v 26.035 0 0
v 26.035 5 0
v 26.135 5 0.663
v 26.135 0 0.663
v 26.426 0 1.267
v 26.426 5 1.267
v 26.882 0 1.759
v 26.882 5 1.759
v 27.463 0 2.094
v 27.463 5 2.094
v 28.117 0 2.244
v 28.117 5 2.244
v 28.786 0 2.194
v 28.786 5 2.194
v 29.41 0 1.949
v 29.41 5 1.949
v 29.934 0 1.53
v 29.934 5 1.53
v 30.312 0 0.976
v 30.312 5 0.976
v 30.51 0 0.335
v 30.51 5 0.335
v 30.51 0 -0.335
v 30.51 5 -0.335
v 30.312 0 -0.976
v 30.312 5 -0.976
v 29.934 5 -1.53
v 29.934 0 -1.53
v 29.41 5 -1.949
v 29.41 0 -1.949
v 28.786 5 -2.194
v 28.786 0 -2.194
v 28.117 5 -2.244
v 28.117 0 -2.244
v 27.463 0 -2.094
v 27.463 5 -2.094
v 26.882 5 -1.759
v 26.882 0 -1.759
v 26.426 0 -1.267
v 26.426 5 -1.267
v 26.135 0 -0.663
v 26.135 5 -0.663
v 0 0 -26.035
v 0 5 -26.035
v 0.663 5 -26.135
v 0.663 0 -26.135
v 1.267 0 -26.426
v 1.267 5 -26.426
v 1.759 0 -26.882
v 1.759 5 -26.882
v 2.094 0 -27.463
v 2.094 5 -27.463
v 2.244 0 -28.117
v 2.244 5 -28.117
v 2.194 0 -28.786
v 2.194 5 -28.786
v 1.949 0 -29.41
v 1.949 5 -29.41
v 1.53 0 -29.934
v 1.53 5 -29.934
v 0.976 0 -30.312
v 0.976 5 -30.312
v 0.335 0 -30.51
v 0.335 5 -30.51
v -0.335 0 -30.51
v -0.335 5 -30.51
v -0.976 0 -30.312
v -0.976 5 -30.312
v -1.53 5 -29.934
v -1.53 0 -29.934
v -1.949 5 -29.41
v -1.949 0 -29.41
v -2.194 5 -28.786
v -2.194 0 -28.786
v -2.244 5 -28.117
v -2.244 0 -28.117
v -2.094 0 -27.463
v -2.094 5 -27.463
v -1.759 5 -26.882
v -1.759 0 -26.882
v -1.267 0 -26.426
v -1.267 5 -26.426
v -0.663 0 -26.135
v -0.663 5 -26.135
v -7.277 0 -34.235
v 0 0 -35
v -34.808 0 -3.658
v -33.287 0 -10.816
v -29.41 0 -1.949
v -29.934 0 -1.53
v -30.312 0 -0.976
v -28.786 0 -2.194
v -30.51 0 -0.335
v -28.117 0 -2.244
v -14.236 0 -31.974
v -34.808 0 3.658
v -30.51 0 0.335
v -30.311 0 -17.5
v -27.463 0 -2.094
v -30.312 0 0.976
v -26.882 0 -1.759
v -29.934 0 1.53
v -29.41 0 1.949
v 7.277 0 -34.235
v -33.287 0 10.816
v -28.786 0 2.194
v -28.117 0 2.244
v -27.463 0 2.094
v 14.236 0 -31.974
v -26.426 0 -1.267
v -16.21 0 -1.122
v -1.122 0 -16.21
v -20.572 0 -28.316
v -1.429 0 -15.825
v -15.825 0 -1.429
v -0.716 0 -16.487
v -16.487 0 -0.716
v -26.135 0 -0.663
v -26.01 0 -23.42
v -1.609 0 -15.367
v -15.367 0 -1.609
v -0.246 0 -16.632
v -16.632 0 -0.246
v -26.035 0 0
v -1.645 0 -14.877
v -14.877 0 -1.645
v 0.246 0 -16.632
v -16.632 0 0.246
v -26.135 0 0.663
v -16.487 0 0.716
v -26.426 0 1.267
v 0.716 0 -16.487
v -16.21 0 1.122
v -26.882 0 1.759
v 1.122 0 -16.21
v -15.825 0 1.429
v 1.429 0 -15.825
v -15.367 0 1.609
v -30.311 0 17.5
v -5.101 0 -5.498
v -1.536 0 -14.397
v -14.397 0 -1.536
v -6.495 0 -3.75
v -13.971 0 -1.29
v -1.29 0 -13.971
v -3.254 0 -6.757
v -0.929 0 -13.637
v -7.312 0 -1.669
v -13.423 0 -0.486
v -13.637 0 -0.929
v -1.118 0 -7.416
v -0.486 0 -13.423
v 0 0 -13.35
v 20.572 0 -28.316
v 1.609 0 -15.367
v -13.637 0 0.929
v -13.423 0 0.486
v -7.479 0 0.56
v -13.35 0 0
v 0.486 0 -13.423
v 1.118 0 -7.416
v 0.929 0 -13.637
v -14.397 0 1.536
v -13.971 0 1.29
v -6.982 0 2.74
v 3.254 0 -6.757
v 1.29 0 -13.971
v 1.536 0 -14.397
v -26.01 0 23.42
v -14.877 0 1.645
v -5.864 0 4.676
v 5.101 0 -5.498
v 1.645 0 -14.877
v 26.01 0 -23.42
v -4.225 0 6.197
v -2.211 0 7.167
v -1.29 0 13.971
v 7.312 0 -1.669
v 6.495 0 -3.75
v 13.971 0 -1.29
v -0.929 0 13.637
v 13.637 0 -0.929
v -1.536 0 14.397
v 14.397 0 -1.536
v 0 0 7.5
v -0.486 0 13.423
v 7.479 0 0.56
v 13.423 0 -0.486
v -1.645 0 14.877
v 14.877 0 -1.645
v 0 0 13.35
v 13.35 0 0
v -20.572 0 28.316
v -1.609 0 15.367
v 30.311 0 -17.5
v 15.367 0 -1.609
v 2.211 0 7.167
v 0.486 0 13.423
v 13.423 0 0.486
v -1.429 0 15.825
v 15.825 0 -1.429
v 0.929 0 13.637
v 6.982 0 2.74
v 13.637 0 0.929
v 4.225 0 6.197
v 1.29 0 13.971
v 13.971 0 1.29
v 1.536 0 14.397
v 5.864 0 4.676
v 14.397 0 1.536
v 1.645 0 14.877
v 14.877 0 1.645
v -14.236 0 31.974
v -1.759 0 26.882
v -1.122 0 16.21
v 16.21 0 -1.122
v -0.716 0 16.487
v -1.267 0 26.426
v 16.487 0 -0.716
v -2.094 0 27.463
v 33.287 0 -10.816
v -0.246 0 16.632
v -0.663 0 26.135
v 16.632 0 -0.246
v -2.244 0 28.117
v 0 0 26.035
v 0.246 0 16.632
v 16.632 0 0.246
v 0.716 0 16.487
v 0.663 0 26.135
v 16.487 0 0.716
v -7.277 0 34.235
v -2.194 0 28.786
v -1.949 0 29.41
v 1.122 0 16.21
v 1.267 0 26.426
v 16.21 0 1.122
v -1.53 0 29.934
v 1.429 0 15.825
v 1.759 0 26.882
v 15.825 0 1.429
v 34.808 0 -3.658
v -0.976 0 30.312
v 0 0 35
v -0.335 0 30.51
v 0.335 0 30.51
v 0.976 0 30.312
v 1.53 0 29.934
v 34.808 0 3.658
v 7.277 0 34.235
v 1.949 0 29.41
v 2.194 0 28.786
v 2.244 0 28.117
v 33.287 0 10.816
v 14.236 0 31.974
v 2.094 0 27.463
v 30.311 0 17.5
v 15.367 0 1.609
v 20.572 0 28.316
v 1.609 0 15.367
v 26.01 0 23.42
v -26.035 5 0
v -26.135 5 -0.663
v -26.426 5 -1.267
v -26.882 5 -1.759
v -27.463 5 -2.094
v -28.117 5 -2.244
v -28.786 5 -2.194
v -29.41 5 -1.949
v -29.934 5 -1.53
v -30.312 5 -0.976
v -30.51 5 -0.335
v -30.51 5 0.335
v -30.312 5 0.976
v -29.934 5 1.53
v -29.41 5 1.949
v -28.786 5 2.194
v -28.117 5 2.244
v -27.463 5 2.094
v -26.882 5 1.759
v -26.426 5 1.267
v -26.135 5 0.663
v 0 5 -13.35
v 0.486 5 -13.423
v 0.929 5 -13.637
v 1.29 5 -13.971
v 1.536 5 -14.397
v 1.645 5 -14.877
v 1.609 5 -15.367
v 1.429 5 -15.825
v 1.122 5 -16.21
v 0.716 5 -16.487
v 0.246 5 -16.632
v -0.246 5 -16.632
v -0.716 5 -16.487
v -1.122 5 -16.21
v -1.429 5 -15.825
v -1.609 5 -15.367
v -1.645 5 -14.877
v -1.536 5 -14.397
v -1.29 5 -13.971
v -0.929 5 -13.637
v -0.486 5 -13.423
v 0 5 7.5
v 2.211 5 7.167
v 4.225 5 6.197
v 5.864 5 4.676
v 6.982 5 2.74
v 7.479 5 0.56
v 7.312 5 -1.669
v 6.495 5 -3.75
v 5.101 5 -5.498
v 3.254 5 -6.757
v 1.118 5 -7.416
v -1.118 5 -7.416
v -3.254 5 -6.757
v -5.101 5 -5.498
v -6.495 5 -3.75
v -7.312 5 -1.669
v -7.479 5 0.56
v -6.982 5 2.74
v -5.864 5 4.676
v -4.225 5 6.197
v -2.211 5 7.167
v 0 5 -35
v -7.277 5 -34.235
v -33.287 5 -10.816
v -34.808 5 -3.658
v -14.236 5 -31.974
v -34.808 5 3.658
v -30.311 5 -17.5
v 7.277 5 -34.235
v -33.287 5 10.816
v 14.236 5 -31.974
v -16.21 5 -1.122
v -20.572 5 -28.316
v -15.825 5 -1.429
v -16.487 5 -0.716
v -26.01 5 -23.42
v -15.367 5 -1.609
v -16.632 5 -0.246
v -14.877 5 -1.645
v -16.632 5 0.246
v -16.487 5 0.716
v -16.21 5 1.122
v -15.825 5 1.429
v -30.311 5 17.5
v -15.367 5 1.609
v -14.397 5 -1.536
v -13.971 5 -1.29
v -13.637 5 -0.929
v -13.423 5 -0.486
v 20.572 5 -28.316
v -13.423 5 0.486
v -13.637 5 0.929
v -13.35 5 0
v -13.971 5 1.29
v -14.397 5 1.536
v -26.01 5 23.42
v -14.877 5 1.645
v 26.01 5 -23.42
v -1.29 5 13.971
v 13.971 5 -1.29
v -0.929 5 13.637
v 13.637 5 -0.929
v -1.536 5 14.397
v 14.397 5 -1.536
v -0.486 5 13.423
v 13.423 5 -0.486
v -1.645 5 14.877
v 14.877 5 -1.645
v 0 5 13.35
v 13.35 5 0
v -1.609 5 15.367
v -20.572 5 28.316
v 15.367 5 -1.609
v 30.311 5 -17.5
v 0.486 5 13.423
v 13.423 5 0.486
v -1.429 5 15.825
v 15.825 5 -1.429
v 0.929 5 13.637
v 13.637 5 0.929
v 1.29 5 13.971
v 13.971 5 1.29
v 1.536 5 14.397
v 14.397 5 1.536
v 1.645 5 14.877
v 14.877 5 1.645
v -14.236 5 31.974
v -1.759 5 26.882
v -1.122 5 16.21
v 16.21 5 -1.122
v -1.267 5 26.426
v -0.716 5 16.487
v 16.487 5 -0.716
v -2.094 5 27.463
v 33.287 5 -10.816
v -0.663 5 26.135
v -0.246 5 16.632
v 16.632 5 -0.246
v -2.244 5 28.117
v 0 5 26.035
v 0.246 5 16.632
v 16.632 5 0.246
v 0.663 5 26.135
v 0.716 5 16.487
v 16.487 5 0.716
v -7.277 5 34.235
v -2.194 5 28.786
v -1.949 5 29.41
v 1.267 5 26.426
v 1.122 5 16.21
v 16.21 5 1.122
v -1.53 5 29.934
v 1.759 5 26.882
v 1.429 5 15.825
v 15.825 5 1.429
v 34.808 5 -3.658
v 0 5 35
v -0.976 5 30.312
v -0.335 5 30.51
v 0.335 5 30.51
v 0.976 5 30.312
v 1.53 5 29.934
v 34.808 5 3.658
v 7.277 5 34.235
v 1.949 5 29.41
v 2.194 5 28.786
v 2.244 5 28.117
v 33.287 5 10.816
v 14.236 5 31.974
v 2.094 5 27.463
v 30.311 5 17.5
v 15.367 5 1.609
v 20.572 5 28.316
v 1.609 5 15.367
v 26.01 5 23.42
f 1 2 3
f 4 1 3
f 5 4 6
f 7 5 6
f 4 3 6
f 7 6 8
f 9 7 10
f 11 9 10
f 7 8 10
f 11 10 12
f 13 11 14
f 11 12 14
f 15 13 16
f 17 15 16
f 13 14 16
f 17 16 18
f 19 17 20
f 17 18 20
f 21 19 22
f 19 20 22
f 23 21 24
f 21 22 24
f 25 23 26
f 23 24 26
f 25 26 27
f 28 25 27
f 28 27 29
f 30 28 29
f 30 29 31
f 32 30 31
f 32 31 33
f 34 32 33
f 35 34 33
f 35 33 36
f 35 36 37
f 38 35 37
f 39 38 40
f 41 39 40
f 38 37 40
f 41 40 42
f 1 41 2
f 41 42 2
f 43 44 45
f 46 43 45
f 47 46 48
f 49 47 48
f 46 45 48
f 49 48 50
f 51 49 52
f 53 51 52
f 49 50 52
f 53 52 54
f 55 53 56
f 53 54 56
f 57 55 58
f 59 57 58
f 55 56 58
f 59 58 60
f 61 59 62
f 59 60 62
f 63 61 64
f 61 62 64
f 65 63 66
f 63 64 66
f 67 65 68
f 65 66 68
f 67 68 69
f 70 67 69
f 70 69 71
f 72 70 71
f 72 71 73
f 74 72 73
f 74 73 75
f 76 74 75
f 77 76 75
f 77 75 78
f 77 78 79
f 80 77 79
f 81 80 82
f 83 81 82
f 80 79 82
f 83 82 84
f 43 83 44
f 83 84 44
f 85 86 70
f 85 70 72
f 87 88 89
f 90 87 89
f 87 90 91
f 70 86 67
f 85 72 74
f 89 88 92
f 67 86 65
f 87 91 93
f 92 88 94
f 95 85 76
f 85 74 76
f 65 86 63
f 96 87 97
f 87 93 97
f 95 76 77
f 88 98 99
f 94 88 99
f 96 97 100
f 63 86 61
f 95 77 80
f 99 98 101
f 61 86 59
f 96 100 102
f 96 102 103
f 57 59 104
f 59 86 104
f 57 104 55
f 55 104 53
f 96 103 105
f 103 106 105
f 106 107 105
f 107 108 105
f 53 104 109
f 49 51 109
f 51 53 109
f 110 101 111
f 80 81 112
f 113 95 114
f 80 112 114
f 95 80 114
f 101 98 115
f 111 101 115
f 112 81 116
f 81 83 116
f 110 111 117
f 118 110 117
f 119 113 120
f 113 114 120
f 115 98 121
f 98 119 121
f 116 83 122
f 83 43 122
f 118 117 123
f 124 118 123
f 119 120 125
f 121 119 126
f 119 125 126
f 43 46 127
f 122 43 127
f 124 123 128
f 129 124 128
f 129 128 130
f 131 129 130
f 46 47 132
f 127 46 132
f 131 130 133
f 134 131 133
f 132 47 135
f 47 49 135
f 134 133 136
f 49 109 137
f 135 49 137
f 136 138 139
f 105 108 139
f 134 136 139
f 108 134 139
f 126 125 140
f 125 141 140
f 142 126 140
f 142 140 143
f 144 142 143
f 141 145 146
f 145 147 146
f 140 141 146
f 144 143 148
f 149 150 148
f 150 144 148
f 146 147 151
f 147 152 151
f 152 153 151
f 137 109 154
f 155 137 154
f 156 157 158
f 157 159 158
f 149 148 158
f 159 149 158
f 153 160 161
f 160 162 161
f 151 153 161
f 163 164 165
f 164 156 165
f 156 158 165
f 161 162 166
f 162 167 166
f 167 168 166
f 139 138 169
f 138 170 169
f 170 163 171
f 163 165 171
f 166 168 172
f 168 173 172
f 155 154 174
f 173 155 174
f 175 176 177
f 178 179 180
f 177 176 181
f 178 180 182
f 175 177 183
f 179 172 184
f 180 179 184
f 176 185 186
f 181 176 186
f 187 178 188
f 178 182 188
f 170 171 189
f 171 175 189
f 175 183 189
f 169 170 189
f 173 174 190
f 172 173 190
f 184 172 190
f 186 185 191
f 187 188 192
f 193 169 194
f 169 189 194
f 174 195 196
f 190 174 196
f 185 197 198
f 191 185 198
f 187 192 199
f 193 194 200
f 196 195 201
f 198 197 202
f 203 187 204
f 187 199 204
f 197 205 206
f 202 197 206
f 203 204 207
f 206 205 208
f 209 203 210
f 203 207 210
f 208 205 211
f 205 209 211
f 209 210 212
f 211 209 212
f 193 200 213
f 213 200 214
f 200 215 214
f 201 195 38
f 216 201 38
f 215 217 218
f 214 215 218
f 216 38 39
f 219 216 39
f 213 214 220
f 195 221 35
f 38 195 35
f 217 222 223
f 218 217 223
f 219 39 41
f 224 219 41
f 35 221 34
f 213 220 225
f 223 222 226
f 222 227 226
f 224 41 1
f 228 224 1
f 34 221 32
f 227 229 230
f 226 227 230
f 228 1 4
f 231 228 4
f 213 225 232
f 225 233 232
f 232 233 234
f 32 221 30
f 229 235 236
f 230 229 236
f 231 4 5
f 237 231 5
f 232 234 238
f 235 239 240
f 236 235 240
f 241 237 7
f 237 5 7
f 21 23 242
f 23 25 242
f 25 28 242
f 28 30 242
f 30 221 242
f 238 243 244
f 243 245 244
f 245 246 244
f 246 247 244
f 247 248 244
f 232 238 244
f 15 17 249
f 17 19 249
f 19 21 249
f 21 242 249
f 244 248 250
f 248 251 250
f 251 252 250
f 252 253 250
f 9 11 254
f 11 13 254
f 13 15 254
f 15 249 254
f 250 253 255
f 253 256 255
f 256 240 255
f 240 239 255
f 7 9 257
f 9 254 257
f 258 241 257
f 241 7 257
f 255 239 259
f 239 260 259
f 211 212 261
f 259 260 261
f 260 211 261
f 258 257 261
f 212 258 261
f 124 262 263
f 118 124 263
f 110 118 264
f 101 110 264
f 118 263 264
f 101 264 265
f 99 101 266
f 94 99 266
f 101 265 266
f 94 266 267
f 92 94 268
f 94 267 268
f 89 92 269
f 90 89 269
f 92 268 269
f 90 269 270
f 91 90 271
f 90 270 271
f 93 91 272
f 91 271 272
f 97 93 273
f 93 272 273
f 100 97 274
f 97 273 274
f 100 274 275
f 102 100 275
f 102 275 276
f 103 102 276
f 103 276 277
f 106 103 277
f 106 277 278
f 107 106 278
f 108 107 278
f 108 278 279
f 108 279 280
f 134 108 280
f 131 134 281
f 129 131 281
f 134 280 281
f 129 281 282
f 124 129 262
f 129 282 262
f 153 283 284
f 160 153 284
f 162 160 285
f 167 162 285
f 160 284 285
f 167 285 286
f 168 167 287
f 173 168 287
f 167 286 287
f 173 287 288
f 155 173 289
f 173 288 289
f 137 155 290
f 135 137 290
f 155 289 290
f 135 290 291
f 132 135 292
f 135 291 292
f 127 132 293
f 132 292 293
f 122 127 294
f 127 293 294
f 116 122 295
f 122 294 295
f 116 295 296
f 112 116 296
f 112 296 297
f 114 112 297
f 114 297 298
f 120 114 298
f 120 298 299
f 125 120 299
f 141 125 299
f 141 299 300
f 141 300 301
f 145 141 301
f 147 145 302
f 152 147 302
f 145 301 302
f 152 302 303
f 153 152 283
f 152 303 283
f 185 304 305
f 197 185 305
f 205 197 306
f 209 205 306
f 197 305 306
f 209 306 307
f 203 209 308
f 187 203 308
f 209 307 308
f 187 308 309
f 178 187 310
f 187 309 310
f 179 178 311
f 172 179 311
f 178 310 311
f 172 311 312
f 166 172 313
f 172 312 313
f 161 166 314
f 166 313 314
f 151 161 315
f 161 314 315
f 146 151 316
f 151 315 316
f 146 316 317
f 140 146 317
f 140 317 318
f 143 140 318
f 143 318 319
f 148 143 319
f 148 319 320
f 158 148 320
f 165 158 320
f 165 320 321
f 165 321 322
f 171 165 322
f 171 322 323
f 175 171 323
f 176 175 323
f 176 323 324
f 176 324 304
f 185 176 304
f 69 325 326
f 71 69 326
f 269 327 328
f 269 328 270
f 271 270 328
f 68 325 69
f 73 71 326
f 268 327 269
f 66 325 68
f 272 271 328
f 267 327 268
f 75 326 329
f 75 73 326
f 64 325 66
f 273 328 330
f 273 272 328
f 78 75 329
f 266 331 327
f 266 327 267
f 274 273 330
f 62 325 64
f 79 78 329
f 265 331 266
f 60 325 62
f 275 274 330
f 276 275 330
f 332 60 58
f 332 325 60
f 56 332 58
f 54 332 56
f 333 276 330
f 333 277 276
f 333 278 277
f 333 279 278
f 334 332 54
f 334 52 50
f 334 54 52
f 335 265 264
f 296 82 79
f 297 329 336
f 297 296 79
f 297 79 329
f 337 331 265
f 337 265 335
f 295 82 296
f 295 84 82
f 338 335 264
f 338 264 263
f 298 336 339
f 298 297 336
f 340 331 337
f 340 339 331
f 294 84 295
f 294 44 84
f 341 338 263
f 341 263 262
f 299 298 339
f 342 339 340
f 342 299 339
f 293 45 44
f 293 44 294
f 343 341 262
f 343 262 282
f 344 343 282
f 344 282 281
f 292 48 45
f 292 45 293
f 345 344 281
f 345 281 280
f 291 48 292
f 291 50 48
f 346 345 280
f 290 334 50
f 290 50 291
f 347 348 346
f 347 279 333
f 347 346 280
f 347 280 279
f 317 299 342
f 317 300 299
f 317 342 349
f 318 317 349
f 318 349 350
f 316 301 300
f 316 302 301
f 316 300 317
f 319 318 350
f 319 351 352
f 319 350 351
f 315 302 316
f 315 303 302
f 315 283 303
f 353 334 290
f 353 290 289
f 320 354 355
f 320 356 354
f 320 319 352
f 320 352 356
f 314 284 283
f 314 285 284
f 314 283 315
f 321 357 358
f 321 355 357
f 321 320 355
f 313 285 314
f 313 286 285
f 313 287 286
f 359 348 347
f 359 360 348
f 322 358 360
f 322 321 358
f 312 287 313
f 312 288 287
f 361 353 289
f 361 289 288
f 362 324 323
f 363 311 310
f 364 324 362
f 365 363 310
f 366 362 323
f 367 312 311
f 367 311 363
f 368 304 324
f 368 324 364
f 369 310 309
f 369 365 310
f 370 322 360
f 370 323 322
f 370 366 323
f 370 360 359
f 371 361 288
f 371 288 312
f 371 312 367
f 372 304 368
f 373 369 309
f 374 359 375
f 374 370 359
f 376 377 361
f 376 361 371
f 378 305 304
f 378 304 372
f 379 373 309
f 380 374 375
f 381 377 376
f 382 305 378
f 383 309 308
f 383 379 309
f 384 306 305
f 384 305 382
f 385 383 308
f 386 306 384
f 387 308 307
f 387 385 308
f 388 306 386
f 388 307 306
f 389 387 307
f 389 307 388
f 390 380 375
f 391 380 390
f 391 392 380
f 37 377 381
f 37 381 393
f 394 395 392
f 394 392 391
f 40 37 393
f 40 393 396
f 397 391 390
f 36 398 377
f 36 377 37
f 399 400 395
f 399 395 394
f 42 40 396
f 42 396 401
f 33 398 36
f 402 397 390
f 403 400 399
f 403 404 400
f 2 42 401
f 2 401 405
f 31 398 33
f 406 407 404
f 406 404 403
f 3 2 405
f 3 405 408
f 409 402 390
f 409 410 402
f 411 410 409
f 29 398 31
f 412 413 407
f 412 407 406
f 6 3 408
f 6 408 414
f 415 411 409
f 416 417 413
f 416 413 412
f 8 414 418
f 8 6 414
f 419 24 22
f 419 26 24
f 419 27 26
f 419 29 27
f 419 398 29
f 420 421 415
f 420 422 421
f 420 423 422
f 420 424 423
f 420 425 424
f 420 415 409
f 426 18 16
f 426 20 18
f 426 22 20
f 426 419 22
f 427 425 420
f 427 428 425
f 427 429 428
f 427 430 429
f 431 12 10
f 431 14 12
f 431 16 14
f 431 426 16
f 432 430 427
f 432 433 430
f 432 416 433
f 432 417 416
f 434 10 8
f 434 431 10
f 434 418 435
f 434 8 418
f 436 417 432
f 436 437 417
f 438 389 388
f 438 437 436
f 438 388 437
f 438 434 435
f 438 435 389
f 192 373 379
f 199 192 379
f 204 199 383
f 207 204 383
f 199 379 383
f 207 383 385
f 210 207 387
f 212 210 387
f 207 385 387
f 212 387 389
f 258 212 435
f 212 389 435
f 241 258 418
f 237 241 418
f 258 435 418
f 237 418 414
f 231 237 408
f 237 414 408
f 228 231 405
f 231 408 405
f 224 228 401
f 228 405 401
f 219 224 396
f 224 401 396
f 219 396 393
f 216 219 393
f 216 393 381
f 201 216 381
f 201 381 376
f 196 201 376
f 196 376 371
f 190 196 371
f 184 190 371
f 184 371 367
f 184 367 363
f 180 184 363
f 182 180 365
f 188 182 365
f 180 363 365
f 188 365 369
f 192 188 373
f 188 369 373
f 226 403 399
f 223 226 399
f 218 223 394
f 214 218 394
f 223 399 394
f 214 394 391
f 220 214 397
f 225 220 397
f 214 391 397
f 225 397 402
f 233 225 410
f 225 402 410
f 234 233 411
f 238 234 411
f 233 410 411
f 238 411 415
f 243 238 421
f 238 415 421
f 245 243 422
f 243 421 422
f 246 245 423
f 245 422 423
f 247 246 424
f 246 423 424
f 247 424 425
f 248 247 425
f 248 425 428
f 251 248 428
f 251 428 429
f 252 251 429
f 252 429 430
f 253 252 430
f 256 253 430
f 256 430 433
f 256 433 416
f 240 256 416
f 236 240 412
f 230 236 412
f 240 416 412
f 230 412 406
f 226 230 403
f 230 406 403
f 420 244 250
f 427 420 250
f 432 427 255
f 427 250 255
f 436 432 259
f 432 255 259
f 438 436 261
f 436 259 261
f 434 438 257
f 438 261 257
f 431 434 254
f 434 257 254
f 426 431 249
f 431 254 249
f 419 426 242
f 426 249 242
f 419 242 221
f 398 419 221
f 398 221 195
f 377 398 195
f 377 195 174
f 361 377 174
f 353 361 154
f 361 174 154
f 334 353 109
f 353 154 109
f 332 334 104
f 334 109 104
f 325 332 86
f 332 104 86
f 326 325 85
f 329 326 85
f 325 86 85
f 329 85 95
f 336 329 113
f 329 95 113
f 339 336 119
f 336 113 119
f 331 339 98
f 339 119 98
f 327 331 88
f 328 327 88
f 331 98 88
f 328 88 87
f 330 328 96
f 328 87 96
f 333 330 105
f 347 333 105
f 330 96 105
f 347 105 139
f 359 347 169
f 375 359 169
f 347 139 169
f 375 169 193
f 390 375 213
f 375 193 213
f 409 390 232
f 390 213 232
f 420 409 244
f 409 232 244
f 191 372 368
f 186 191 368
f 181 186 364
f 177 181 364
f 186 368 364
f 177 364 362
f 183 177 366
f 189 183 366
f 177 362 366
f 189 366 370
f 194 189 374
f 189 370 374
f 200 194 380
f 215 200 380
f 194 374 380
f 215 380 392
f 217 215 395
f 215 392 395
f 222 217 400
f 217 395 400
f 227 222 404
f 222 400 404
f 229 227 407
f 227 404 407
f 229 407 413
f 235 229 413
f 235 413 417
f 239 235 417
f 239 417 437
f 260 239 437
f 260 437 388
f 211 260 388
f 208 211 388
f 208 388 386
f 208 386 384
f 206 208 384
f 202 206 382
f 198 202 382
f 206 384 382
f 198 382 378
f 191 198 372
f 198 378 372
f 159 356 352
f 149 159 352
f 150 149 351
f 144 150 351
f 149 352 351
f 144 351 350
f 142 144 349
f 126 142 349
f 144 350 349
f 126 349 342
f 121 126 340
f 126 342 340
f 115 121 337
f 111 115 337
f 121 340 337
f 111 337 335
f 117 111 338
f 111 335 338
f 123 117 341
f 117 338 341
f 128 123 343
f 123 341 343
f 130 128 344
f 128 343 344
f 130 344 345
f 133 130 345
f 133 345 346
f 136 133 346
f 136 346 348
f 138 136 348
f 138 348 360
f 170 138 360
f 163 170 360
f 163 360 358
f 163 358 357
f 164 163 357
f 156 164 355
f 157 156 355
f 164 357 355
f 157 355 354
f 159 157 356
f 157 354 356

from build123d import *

# Parameters (mm, degrees)
SKETCH1_R           = 35
BOSS_EXTRUDE1_DEPTH = 5
SKETCH2_R           = 2.25
CUT_EXTRUDE1_DEPTH  = 5
CIRPATTERN2_COUNT   = 4
SKETCH3_R           = 1.65
CUT_EXTRUDE2_DEPTH  = 5
CIRPATTERN3_COUNT   = 4
SKETCH4_R           = 7.5
CUT_EXTRUDE3_DEPTH  = 50.749371855


with BuildPart() as part:
    # Sketch1 → Boss-Extrude1 (new body)
    with BuildSketch(Plane(origin=(0, 0, 0), x_dir=(1, 0, 0), z_dir=(0, 1, 0))):
        with Locations(Location((0, 0, 0), (0, 0, 270))):
            Circle(SKETCH1_R)
    extrude(amount=BOSS_EXTRUDE1_DEPTH)

    # Sketch2 → Cut-Extrude1 (cut)
    with BuildSketch(Plane(origin=(0, 5, 0), x_dir=(1, 0, 0), z_dir=(0, 1, 0))):
        with Locations(Location((0, 28.285, 0), (0, 0, 270))):
            Circle(SKETCH2_R)
    cut_extrude1 = extrude(amount=-CUT_EXTRUDE1_DEPTH, mode=Mode.SUBTRACT)

    # CirPattern2: Cut-Extrude1 ×4 about axis
    cirpattern2_axis = Axis((0, 0, 0), (0, 1, 0))
    for i in range(1, CIRPATTERN2_COUNT):
        add(cut_extrude1.rotate(cirpattern2_axis, i * 360 / CIRPATTERN2_COUNT), mode=Mode.SUBTRACT)

    # Sketch3 → Cut-Extrude2 (cut)
    with BuildSketch(Plane(origin=(0, 5, 0), x_dir=(1, 0, 0), z_dir=(0, 1, 0))):
        with Locations(Location((0, 15, 0), (0, 0, 270))):
            Circle(SKETCH3_R)
    cut_extrude2 = extrude(amount=-CUT_EXTRUDE2_DEPTH, mode=Mode.SUBTRACT)

    # CirPattern3: Cut-Extrude2 ×4 about axis
    cirpattern3_axis = Axis((0, 0, 0), (0, 1, 0))
    for i in range(1, CIRPATTERN3_COUNT):
        add(cut_extrude2.rotate(cirpattern3_axis, i * 360 / CIRPATTERN3_COUNT), mode=Mode.SUBTRACT)

    # Sketch4 → Cut-Extrude3 (cut, through all)
    with BuildSketch(Plane(origin=(0, 5, 0), x_dir=(1, 0, 0), z_dir=(0, 1, 0))):
        with Locations(Location((0, 0, 0), (0, 0, 270))):
            Circle(SKETCH4_R)
    extrude(amount=-CUT_EXTRUDE3_DEPTH, mode=Mode.SUBTRACT)


solid = part.part
